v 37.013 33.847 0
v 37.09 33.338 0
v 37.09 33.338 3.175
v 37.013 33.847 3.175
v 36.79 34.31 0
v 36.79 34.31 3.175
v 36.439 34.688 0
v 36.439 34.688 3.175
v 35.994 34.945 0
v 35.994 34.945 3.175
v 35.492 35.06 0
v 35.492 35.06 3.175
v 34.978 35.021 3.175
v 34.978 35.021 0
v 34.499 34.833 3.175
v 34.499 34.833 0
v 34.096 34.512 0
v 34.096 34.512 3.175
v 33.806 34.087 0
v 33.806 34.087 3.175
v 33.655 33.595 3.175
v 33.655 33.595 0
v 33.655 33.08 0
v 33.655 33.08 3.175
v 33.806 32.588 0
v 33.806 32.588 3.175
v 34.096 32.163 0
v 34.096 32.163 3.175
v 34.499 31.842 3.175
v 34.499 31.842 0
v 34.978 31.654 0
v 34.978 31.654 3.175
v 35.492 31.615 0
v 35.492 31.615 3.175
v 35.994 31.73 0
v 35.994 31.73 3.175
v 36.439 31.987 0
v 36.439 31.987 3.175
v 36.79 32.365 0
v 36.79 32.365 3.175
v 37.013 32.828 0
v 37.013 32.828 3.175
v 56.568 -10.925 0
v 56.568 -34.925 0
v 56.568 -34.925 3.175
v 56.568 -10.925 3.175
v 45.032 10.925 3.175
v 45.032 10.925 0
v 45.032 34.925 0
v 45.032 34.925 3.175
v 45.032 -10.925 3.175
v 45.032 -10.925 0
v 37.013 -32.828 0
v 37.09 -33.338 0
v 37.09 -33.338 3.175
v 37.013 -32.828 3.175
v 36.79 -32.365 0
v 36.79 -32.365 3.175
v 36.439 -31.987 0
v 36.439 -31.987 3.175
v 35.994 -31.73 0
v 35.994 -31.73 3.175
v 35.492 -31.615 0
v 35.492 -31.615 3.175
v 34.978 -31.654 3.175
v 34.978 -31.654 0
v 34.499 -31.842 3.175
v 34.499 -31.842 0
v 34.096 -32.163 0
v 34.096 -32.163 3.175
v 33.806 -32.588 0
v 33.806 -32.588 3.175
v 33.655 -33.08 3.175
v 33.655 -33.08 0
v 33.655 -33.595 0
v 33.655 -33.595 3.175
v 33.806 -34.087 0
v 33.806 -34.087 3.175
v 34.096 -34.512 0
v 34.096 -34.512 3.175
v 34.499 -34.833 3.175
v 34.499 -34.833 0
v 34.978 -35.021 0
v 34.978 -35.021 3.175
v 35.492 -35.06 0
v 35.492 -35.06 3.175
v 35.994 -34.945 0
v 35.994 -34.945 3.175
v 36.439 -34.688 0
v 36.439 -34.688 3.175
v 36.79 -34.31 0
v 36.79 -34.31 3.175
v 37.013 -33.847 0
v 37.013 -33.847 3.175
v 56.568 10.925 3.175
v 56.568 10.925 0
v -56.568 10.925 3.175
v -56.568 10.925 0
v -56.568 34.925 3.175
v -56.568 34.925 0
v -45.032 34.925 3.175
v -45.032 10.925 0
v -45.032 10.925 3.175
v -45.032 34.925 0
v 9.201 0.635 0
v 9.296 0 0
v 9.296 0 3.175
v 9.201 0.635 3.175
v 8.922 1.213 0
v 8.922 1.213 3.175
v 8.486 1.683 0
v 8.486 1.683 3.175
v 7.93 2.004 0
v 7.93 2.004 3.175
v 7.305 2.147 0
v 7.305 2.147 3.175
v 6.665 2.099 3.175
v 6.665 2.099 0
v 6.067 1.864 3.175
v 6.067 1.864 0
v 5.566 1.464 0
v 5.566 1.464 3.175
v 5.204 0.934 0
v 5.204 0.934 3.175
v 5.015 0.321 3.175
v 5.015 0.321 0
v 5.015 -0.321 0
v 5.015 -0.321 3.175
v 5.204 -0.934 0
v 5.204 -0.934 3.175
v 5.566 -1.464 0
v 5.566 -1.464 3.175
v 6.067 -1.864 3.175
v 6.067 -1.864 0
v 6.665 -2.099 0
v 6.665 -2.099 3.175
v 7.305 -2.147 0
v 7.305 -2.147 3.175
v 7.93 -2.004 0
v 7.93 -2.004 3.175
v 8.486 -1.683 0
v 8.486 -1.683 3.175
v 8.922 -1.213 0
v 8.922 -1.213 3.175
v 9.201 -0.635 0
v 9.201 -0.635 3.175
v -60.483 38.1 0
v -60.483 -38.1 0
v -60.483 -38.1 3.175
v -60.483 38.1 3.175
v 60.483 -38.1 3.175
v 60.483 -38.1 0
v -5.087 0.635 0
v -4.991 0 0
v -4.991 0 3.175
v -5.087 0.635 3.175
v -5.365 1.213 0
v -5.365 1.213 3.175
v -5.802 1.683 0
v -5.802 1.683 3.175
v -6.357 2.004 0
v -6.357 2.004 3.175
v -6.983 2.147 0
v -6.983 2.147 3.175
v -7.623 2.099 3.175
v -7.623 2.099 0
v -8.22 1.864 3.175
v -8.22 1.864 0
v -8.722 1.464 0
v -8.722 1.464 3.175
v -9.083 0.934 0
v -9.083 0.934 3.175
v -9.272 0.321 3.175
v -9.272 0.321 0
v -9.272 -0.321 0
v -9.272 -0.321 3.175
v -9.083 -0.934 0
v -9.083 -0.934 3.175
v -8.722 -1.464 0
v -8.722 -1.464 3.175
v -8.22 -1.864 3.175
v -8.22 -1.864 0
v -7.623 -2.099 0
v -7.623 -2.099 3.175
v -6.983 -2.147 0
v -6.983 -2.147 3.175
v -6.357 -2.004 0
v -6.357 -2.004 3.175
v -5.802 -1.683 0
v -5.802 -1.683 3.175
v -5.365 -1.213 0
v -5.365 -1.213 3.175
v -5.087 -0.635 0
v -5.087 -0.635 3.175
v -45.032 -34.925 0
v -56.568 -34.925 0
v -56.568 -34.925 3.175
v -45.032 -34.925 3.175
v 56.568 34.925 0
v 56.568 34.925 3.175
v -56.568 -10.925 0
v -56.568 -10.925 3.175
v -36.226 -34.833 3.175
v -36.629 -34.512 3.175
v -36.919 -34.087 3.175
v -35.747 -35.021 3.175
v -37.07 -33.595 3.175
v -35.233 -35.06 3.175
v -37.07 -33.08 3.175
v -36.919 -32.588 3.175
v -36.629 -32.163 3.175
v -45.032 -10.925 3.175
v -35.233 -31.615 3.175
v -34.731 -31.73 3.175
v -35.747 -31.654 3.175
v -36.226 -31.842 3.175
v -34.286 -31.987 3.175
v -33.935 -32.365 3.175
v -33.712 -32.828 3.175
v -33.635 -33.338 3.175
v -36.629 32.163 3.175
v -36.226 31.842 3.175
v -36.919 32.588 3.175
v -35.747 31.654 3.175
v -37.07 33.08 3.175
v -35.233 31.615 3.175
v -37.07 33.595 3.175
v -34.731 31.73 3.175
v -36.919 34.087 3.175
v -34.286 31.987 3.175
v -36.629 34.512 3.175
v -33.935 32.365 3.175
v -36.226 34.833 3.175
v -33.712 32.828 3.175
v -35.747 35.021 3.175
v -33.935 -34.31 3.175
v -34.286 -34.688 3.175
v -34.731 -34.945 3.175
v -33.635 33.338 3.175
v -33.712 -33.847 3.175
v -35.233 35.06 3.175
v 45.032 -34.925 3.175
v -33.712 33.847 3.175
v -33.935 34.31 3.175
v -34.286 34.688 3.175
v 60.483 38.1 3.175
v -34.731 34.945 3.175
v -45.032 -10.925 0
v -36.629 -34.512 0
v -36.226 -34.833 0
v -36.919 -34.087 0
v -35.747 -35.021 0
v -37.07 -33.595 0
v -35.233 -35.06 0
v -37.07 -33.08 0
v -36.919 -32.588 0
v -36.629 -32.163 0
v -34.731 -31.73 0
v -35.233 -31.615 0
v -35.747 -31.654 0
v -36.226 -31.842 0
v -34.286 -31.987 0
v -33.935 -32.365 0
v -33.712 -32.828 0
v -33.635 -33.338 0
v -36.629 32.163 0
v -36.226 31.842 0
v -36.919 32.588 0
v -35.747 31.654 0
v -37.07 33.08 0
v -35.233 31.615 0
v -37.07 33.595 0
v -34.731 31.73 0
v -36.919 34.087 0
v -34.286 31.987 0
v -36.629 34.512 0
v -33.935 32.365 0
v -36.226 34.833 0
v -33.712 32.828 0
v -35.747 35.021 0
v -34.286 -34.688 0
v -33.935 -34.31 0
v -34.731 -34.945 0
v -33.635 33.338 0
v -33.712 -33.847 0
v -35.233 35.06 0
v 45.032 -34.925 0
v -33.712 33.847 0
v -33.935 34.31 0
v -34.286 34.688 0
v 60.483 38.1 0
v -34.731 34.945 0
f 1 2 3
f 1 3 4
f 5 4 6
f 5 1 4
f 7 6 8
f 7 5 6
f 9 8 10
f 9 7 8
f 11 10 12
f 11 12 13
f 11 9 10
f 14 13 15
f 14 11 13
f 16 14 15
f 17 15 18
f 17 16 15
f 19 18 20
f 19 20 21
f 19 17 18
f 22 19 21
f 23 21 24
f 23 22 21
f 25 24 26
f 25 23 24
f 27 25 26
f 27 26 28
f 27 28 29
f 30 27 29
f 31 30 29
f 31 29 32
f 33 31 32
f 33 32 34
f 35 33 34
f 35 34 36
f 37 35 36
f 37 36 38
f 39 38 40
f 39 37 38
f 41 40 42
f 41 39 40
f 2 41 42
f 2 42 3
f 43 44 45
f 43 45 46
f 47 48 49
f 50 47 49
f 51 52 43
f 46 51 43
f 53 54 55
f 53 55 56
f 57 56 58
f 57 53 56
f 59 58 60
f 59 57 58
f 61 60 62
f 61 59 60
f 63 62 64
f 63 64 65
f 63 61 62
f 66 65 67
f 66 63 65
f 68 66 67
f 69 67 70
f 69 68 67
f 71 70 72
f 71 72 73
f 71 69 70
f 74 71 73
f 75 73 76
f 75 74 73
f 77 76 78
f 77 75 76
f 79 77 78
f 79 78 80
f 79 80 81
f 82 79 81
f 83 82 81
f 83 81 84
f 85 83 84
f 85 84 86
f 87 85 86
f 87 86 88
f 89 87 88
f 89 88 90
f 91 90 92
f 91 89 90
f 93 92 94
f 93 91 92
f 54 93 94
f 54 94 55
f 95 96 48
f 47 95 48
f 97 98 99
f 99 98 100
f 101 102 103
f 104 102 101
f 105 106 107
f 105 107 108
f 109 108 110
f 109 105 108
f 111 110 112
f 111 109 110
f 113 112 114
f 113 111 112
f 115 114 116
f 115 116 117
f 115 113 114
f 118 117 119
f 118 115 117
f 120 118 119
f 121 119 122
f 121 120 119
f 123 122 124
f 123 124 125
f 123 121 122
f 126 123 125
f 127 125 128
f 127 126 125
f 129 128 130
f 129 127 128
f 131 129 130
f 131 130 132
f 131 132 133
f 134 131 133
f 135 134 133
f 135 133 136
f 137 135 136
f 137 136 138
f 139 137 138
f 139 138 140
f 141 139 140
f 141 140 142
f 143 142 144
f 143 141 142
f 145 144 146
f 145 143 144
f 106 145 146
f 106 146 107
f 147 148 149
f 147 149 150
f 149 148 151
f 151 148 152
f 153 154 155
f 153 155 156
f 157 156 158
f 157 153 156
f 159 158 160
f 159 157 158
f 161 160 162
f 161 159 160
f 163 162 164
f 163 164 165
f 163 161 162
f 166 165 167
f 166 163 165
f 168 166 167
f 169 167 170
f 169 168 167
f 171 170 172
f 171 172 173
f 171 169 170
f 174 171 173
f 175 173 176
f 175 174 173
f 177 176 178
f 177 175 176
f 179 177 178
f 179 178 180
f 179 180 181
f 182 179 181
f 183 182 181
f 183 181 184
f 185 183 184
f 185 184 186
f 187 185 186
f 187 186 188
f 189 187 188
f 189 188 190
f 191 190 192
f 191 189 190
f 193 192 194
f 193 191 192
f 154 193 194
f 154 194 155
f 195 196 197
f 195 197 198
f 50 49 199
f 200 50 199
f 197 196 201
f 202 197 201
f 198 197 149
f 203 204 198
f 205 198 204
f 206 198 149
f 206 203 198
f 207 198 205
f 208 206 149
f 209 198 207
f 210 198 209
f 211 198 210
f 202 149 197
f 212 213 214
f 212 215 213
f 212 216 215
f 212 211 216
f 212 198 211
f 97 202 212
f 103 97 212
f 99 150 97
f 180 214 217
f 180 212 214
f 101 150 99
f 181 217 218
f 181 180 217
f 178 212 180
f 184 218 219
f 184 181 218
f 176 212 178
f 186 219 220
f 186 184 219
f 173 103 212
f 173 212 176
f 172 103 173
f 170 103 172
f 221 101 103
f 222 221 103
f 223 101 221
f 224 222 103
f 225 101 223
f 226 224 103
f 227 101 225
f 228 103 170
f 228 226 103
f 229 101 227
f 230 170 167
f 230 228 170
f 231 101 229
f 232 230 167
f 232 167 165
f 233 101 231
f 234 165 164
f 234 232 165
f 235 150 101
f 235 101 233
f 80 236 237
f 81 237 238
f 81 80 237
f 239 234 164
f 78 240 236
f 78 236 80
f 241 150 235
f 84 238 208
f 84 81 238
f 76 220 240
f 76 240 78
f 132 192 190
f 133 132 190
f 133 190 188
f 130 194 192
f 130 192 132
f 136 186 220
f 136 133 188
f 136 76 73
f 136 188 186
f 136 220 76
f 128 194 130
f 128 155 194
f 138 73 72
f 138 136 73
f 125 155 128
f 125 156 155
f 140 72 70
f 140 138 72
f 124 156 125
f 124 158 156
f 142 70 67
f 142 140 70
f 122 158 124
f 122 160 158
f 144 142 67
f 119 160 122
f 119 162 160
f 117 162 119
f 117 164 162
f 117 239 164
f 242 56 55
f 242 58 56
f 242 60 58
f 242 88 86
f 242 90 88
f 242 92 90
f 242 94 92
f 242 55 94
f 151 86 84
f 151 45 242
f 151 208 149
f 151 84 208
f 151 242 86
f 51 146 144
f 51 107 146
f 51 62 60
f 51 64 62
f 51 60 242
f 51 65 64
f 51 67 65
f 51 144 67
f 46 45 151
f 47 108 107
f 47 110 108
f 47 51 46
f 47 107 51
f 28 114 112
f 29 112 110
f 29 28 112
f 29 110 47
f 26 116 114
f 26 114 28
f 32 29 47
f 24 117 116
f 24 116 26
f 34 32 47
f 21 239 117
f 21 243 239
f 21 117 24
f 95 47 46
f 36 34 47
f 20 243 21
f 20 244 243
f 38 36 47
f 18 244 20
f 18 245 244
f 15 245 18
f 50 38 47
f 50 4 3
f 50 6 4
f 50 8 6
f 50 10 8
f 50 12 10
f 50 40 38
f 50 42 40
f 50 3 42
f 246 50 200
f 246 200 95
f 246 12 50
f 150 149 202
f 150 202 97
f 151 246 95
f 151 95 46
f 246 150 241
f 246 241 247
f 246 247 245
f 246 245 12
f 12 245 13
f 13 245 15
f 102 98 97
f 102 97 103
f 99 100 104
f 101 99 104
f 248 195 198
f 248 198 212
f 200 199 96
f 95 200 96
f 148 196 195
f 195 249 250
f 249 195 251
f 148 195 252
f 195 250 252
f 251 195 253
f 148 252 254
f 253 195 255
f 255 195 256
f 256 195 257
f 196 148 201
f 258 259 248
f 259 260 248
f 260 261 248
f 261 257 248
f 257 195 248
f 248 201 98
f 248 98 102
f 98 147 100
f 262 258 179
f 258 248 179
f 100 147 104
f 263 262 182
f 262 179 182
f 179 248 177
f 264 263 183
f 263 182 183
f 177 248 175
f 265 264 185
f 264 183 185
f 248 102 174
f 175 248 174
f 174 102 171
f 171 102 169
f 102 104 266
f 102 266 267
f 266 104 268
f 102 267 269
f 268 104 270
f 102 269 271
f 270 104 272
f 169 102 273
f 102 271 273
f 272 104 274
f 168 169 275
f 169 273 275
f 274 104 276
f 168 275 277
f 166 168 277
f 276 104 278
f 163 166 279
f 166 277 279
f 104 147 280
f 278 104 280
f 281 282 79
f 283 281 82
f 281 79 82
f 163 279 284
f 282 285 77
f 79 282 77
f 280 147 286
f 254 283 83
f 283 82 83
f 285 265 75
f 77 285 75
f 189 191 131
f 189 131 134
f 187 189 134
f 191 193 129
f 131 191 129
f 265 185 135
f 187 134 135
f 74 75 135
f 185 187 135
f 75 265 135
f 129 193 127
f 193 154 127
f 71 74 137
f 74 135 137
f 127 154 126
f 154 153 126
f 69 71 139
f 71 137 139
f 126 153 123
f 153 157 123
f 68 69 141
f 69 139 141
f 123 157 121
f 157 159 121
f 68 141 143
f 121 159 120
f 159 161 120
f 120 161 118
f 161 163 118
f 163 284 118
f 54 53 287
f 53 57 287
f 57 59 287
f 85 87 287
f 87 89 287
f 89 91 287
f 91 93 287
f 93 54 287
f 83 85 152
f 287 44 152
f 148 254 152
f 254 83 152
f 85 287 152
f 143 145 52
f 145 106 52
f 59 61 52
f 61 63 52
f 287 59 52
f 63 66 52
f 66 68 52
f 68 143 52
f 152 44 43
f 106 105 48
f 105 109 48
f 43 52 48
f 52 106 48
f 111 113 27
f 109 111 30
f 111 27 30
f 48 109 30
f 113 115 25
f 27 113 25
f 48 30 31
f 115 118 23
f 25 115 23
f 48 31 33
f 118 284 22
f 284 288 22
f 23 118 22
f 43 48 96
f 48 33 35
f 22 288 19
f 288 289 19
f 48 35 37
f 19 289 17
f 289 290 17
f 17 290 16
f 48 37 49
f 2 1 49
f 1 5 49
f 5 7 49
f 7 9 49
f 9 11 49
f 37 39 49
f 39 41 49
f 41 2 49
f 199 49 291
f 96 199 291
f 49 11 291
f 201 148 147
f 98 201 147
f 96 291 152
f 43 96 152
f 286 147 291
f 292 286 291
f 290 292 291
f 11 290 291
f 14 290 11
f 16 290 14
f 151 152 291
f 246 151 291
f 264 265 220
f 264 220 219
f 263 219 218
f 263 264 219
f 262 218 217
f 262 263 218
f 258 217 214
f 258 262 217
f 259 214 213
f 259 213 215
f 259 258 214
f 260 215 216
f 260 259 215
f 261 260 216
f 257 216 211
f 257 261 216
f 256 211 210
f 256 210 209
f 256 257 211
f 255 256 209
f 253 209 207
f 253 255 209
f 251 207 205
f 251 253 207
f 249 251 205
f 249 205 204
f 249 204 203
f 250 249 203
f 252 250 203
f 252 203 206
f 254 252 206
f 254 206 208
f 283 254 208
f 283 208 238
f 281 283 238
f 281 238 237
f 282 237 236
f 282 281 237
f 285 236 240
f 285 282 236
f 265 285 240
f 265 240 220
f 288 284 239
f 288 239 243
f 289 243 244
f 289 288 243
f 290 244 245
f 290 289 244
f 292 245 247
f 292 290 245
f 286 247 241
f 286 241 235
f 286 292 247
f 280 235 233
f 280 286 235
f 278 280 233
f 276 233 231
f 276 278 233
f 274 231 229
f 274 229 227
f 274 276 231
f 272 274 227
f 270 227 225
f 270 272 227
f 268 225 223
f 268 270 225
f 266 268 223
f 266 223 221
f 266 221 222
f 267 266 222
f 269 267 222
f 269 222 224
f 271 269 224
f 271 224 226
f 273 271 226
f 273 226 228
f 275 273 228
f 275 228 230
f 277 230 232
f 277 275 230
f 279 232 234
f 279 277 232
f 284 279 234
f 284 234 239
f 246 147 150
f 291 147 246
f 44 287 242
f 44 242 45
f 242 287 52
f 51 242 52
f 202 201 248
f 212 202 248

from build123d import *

# Parameters (mm, degrees)
F0_W     = 120.965316
F0_H     = 76.2
F0_R     = 1.7272
F0_W_2   = 11.536045
F0_H_2   = 24
F0_R_2   = 2.15265
F1_DEPTH = 3.175


with BuildPart() as f1:
    # F0 (on Top) → F1 (new body)
    with BuildSketch(Plane.XY):
        Rectangle(F0_W, F0_H)
        with Locations((-35.36249, -33.3375)):
            Circle(F0_R, mode=Mode.SUBTRACT)
        with Locations((-50.8, -22.925)):
            Rectangle(F0_W_2, F0_H_2, mode=Mode.SUBTRACT)
        with Locations((35.36249, -33.3375)):
            Circle(F0_R, mode=Mode.SUBTRACT)
        with Locations((50.8, -22.925)):
            Rectangle(F0_W_2, F0_H_2, mode=Mode.SUBTRACT)
        with Locations((-7.14375, 0)):
            Circle(F0_R_2, mode=Mode.SUBTRACT)
        with Locations((-50.8, 22.925)):
            Rectangle(F0_W_2, F0_H_2, mode=Mode.SUBTRACT)
        with Locations((-35.36249, 33.3375)):
            Circle(F0_R, mode=Mode.SUBTRACT)
        with Locations((7.14375, 0)):
            Circle(F0_R_2, mode=Mode.SUBTRACT)
        Polygon((45.031977, 34.925), (56.568022, 34.925), (56.568023, 10.925), (45.031978, 10.925), align=None, mode=Mode.SUBTRACT)
        with Locations((35.36249, 33.3375)):
            Circle(F0_R, mode=Mode.SUBTRACT)
    extrude(amount=F1_DEPTH)


solid = f1.part
